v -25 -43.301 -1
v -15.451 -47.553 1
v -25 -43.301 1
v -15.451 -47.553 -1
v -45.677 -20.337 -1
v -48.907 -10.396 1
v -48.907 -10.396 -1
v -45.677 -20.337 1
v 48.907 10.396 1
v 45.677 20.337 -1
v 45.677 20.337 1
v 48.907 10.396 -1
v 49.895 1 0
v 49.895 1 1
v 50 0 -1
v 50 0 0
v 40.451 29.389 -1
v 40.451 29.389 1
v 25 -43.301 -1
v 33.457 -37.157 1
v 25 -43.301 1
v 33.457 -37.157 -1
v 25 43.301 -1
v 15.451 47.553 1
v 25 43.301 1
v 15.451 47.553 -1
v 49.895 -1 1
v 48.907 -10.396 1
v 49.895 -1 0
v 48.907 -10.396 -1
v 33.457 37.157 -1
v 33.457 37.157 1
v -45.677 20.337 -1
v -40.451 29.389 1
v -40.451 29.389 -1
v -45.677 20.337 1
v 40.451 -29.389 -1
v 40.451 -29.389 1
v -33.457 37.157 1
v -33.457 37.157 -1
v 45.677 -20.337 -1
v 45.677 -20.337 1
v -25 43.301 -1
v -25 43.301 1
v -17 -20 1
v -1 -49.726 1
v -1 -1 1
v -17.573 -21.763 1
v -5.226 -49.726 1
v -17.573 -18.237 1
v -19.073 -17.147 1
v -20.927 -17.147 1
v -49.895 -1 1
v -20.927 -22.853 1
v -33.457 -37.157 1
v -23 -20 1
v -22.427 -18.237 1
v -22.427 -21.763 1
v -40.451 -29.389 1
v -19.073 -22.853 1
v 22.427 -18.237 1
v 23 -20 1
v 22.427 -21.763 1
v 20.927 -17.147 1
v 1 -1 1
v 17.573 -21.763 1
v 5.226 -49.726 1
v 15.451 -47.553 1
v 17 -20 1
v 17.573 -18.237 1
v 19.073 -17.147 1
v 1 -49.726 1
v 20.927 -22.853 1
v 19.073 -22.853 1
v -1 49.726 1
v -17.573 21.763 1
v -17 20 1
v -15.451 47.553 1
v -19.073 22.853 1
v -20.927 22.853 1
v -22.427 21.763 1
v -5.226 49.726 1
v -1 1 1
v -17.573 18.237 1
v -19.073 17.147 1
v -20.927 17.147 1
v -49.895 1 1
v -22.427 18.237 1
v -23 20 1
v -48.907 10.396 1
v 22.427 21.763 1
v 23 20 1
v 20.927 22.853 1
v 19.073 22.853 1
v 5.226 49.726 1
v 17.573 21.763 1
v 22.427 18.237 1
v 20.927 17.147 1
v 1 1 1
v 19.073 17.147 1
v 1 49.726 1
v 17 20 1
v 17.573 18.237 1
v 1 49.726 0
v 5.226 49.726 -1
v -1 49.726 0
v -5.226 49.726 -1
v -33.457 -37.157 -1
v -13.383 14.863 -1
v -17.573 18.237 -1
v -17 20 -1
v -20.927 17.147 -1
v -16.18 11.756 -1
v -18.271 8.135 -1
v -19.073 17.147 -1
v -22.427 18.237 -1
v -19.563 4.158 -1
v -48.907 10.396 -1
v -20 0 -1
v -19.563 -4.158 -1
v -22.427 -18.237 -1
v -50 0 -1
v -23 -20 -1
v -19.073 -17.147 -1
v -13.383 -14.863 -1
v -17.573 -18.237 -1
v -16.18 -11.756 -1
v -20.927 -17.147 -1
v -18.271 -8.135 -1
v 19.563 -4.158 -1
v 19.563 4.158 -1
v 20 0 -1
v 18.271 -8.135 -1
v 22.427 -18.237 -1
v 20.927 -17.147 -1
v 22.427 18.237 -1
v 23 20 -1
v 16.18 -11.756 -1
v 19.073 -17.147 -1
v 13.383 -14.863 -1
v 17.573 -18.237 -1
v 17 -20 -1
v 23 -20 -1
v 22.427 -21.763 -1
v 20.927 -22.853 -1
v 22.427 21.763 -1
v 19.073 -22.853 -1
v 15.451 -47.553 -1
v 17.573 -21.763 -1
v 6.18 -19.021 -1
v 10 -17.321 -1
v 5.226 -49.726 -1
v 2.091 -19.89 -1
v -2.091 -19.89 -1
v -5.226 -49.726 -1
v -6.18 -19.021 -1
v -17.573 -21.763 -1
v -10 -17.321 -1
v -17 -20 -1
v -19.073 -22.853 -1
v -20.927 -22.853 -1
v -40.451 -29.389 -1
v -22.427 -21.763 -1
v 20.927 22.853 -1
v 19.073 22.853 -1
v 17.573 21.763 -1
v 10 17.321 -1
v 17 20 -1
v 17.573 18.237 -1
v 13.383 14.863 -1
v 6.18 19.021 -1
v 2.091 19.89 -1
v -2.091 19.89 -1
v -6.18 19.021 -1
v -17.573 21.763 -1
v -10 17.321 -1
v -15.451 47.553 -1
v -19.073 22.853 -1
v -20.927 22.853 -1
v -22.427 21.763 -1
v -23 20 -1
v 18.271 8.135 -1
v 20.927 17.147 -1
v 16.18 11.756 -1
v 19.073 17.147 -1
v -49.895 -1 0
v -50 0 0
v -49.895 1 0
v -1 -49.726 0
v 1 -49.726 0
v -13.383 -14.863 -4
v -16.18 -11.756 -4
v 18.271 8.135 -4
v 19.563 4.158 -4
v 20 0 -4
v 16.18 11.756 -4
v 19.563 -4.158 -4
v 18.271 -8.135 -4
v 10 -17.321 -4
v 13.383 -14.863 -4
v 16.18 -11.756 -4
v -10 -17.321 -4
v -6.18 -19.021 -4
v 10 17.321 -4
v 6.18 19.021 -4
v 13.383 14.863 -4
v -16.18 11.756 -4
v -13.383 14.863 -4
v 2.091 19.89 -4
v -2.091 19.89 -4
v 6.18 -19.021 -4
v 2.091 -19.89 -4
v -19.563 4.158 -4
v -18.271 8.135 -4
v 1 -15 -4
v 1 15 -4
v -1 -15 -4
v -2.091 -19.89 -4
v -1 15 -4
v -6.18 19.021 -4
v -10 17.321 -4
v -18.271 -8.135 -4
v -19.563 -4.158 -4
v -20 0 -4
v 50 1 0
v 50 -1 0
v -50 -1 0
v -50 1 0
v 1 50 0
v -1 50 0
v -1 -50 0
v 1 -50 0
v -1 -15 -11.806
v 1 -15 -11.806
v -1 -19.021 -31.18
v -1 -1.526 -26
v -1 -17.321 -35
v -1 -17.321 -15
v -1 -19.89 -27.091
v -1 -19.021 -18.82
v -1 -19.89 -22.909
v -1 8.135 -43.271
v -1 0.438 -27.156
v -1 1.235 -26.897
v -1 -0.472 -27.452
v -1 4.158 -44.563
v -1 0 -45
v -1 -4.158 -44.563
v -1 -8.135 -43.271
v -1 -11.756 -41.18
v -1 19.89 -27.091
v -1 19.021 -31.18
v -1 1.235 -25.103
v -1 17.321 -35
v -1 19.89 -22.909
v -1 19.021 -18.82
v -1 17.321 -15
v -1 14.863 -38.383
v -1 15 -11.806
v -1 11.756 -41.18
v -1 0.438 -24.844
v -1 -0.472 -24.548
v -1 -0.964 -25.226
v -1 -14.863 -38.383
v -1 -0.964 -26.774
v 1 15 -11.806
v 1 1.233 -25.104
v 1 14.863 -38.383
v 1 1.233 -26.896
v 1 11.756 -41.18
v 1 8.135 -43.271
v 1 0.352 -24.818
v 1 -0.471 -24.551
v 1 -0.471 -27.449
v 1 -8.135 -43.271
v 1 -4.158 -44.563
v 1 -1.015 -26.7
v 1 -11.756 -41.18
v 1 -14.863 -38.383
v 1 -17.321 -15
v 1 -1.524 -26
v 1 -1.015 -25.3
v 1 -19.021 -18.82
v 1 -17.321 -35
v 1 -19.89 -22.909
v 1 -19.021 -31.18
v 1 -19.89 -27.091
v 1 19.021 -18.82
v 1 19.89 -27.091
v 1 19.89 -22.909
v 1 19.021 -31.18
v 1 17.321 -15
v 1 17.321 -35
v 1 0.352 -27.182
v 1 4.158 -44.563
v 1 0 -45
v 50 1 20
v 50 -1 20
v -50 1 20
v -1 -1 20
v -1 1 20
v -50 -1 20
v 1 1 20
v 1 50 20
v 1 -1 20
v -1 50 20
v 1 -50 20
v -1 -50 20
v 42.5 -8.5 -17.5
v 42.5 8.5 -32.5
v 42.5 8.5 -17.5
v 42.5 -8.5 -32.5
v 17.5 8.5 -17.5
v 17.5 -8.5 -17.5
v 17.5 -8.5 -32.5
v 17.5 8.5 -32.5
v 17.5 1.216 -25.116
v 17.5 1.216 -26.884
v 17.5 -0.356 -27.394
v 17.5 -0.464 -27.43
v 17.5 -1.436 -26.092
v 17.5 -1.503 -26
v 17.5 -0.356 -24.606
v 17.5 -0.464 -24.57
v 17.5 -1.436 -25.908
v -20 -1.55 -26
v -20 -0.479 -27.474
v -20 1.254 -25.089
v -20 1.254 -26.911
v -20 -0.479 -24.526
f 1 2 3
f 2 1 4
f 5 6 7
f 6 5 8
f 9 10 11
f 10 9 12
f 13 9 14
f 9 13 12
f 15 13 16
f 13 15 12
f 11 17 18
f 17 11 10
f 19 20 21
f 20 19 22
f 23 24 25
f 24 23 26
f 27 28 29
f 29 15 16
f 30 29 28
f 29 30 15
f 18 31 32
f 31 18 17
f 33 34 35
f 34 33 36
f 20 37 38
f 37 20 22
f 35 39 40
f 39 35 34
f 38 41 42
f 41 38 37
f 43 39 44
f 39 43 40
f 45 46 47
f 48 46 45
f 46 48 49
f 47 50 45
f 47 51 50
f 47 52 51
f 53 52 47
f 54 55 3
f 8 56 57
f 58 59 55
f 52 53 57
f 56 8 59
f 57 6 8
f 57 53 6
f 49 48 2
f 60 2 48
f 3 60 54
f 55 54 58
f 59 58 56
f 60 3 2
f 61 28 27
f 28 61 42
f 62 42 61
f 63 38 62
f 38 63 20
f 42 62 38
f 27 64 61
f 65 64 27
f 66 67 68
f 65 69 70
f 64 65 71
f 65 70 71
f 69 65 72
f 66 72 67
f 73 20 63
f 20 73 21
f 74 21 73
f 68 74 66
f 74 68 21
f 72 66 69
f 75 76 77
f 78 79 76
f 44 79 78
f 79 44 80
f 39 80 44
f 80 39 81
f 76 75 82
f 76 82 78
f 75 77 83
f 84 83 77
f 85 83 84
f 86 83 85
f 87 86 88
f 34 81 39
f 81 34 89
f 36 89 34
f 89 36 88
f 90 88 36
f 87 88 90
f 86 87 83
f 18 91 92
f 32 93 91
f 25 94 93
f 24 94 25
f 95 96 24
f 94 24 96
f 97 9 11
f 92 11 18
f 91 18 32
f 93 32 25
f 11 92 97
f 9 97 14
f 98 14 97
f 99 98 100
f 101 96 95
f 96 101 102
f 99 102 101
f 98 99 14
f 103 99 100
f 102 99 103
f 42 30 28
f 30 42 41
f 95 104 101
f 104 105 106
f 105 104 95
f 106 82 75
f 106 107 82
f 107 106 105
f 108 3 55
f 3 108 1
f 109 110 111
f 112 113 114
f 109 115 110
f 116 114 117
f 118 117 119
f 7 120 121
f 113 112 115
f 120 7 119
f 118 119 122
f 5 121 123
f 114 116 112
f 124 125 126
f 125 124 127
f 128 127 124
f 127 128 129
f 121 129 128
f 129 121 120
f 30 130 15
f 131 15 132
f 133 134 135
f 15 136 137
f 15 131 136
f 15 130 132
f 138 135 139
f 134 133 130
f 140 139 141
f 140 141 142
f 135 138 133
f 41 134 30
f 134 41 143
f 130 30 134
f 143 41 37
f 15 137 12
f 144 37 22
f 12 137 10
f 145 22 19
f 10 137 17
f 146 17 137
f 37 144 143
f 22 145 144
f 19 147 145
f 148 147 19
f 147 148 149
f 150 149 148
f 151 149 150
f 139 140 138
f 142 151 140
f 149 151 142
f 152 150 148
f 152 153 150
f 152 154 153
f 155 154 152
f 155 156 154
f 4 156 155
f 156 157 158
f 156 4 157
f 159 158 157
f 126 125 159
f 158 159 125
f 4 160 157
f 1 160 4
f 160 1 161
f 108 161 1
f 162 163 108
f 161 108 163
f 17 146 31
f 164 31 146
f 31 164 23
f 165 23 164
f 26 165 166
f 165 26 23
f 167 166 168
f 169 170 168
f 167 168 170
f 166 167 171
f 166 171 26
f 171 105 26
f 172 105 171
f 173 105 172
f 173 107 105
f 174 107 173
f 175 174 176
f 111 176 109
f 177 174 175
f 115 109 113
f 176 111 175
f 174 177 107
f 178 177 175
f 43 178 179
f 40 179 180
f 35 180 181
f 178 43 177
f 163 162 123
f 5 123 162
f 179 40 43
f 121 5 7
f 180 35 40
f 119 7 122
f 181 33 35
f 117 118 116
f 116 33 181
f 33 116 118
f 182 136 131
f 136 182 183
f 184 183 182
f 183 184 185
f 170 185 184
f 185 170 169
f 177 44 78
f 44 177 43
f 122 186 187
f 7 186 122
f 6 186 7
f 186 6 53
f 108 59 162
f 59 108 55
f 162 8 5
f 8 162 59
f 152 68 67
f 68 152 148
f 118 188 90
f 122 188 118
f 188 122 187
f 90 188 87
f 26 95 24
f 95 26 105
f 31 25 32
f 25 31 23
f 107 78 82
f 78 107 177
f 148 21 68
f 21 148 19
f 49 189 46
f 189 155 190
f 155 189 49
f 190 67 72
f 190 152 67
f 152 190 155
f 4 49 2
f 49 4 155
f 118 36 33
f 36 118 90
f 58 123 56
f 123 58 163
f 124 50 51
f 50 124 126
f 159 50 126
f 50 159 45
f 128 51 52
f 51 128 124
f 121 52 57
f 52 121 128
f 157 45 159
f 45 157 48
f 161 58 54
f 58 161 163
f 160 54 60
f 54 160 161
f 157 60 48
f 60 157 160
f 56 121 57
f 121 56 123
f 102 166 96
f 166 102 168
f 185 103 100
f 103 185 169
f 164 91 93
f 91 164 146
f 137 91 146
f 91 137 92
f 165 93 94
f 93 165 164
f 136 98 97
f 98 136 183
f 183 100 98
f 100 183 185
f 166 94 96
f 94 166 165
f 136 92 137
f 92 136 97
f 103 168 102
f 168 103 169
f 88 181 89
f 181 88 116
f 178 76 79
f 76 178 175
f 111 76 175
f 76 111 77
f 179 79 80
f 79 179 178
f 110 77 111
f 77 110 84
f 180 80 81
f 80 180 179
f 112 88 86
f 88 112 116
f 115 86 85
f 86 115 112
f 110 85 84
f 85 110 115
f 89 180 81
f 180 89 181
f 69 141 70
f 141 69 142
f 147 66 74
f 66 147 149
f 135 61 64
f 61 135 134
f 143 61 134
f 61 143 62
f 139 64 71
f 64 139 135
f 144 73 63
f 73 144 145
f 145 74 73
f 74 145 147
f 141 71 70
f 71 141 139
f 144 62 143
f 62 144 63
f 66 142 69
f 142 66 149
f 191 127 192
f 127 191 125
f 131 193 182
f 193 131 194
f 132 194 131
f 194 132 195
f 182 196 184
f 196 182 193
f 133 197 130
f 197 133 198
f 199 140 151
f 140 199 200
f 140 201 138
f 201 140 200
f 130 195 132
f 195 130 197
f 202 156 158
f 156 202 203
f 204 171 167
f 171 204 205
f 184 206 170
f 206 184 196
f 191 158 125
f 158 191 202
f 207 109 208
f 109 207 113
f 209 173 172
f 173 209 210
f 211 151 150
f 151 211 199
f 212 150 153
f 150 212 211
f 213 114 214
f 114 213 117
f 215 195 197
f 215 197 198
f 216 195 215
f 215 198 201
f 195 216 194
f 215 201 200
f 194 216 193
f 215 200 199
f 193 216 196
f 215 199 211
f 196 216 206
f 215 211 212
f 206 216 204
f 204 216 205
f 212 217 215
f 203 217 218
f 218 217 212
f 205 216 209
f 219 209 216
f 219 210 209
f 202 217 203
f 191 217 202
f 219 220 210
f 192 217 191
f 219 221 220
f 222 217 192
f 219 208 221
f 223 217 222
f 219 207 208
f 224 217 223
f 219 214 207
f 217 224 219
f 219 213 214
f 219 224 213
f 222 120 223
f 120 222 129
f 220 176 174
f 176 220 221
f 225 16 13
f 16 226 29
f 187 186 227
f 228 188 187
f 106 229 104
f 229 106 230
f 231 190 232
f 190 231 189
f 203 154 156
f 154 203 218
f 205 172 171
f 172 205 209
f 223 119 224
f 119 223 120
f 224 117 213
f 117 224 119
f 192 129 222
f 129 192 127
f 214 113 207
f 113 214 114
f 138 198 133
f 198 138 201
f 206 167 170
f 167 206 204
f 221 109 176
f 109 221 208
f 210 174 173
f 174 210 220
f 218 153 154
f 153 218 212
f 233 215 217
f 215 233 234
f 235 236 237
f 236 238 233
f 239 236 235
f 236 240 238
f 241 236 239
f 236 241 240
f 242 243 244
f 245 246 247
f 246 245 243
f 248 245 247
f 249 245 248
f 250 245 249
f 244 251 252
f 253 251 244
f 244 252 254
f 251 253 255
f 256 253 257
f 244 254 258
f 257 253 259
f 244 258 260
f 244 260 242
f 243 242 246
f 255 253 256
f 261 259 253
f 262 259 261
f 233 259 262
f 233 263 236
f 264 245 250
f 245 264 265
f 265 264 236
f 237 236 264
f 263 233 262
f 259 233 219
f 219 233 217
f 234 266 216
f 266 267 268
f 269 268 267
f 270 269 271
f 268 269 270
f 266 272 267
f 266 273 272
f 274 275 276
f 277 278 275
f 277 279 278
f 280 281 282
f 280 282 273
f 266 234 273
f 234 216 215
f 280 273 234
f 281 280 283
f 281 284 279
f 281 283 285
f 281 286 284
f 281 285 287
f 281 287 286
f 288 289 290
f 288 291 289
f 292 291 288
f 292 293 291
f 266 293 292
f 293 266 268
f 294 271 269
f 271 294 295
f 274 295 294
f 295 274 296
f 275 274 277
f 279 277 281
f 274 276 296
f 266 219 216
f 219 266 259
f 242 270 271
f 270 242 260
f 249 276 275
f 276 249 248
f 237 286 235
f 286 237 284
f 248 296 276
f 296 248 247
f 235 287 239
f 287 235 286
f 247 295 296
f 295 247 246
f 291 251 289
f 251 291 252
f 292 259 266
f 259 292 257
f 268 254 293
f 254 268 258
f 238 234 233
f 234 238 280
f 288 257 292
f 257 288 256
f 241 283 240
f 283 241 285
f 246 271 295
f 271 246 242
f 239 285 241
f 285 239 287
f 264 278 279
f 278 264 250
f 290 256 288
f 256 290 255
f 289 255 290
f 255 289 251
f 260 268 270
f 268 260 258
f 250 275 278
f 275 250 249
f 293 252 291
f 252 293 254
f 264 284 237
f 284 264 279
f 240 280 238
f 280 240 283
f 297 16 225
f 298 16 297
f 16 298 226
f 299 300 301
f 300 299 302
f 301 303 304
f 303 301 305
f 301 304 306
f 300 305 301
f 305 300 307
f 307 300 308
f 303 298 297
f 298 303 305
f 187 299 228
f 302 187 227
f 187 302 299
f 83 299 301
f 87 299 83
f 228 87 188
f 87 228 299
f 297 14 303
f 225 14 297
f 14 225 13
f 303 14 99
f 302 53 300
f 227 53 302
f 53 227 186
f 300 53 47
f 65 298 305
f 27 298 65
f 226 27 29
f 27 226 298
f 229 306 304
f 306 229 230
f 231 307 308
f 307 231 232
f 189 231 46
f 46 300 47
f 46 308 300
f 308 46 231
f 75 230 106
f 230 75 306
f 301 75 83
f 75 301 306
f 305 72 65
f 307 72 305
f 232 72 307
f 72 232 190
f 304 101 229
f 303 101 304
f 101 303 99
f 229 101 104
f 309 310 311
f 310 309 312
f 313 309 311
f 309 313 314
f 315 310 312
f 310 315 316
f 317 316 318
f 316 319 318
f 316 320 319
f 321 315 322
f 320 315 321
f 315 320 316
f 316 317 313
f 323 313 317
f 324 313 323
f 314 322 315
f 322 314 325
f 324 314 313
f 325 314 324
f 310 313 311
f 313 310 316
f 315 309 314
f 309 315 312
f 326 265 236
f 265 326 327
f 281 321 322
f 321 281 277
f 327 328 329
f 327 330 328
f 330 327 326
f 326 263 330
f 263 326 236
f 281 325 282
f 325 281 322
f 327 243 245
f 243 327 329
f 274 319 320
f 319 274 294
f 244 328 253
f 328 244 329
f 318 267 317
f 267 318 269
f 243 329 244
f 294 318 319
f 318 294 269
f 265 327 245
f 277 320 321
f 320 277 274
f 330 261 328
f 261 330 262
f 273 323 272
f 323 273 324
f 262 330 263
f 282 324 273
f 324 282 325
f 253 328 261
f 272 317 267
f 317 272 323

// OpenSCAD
center=true;

/*
 * Rotation disk base
 */
radius=50;
hole_radius=3;


difference() {
cylinder(2, radius, radius, center);

translate([-20,-20, 0]) cylinder(2+3, 3, 3, center);
translate([20,20,0]) cylinder(2+3, 3, 3, center);
translate([-20,20,0]) cylinder(2+3, 3, 3, center);
translate([20,-20,0]) cylinder(2+3, 3, 3, center);
}
/*
 * Bridges
 */
width=radius*2;
depth=2;
height=20;

translate([0,0,10])
cube([width, depth, height], center);

rotate([0,0,90]) 
translate([0,0,10])
cube([width, depth, height], center);

/*
 * Mount for the top part
 */
color([0.75, 1, 0.5, 1]) union() {

    translate([0,0,-4])  cylinder(4, 20, 20);
    

    translate([0,0,-20]) rotate([0, 0, 90]) cube([30, 2, 35], true);
    
    offsetZ_Arc=25;

    rotate([0, 90, 0]) translate([offsetZ_Arc,0,-1]) cylinder(2, 20, 20);
}

/* 
 * Vertical axis motor
 */
motor_cl=[0.4,0.1,0.1,0.4];
color(motor_cl) translate([30, 0, -25]) cube([25, 17, 15], center);

// shaft
shaft_cl=[0,0,0.7,0.7];
color(shaft_cl) rotate([90, 180, 90]) translate([0,26,-20]) cylinder(40, 1.55, 1.5);

/*
 * Vertical motor mount
 */

/*
 * CONTEXT
 */
scalar_outter=1.7;
scalar_inner=scalar_outter*0.95;
/*
 * Base holder
 */ 

% translate([0,0,-110]) cylinder(10, radius*scalar_outter, radius*scalar_outter);

/* 
 * Enclosing case
 */


% difference() {
    translate([0,0,-110]) cylinder(100, radius*scalar_outter, radius*scalar_outter);
    
    translate([0,0,-111]) cylinder(102, scalar_inner, scalar_inner);
}


% difference() {
    bring_lower=40;
    offz=(radius/2)-bring_lower;
    translate([0,0,offz]) sphere(radius*scalar_outter);
    
    // inner space
    translate([0,0,offz]) sphere(radius*scalar_inner);

    a=radius*2*1.5;
    translate([0,0,(-a/2/1.5)-bring_lower]) cube([a,a,a], center);
}
